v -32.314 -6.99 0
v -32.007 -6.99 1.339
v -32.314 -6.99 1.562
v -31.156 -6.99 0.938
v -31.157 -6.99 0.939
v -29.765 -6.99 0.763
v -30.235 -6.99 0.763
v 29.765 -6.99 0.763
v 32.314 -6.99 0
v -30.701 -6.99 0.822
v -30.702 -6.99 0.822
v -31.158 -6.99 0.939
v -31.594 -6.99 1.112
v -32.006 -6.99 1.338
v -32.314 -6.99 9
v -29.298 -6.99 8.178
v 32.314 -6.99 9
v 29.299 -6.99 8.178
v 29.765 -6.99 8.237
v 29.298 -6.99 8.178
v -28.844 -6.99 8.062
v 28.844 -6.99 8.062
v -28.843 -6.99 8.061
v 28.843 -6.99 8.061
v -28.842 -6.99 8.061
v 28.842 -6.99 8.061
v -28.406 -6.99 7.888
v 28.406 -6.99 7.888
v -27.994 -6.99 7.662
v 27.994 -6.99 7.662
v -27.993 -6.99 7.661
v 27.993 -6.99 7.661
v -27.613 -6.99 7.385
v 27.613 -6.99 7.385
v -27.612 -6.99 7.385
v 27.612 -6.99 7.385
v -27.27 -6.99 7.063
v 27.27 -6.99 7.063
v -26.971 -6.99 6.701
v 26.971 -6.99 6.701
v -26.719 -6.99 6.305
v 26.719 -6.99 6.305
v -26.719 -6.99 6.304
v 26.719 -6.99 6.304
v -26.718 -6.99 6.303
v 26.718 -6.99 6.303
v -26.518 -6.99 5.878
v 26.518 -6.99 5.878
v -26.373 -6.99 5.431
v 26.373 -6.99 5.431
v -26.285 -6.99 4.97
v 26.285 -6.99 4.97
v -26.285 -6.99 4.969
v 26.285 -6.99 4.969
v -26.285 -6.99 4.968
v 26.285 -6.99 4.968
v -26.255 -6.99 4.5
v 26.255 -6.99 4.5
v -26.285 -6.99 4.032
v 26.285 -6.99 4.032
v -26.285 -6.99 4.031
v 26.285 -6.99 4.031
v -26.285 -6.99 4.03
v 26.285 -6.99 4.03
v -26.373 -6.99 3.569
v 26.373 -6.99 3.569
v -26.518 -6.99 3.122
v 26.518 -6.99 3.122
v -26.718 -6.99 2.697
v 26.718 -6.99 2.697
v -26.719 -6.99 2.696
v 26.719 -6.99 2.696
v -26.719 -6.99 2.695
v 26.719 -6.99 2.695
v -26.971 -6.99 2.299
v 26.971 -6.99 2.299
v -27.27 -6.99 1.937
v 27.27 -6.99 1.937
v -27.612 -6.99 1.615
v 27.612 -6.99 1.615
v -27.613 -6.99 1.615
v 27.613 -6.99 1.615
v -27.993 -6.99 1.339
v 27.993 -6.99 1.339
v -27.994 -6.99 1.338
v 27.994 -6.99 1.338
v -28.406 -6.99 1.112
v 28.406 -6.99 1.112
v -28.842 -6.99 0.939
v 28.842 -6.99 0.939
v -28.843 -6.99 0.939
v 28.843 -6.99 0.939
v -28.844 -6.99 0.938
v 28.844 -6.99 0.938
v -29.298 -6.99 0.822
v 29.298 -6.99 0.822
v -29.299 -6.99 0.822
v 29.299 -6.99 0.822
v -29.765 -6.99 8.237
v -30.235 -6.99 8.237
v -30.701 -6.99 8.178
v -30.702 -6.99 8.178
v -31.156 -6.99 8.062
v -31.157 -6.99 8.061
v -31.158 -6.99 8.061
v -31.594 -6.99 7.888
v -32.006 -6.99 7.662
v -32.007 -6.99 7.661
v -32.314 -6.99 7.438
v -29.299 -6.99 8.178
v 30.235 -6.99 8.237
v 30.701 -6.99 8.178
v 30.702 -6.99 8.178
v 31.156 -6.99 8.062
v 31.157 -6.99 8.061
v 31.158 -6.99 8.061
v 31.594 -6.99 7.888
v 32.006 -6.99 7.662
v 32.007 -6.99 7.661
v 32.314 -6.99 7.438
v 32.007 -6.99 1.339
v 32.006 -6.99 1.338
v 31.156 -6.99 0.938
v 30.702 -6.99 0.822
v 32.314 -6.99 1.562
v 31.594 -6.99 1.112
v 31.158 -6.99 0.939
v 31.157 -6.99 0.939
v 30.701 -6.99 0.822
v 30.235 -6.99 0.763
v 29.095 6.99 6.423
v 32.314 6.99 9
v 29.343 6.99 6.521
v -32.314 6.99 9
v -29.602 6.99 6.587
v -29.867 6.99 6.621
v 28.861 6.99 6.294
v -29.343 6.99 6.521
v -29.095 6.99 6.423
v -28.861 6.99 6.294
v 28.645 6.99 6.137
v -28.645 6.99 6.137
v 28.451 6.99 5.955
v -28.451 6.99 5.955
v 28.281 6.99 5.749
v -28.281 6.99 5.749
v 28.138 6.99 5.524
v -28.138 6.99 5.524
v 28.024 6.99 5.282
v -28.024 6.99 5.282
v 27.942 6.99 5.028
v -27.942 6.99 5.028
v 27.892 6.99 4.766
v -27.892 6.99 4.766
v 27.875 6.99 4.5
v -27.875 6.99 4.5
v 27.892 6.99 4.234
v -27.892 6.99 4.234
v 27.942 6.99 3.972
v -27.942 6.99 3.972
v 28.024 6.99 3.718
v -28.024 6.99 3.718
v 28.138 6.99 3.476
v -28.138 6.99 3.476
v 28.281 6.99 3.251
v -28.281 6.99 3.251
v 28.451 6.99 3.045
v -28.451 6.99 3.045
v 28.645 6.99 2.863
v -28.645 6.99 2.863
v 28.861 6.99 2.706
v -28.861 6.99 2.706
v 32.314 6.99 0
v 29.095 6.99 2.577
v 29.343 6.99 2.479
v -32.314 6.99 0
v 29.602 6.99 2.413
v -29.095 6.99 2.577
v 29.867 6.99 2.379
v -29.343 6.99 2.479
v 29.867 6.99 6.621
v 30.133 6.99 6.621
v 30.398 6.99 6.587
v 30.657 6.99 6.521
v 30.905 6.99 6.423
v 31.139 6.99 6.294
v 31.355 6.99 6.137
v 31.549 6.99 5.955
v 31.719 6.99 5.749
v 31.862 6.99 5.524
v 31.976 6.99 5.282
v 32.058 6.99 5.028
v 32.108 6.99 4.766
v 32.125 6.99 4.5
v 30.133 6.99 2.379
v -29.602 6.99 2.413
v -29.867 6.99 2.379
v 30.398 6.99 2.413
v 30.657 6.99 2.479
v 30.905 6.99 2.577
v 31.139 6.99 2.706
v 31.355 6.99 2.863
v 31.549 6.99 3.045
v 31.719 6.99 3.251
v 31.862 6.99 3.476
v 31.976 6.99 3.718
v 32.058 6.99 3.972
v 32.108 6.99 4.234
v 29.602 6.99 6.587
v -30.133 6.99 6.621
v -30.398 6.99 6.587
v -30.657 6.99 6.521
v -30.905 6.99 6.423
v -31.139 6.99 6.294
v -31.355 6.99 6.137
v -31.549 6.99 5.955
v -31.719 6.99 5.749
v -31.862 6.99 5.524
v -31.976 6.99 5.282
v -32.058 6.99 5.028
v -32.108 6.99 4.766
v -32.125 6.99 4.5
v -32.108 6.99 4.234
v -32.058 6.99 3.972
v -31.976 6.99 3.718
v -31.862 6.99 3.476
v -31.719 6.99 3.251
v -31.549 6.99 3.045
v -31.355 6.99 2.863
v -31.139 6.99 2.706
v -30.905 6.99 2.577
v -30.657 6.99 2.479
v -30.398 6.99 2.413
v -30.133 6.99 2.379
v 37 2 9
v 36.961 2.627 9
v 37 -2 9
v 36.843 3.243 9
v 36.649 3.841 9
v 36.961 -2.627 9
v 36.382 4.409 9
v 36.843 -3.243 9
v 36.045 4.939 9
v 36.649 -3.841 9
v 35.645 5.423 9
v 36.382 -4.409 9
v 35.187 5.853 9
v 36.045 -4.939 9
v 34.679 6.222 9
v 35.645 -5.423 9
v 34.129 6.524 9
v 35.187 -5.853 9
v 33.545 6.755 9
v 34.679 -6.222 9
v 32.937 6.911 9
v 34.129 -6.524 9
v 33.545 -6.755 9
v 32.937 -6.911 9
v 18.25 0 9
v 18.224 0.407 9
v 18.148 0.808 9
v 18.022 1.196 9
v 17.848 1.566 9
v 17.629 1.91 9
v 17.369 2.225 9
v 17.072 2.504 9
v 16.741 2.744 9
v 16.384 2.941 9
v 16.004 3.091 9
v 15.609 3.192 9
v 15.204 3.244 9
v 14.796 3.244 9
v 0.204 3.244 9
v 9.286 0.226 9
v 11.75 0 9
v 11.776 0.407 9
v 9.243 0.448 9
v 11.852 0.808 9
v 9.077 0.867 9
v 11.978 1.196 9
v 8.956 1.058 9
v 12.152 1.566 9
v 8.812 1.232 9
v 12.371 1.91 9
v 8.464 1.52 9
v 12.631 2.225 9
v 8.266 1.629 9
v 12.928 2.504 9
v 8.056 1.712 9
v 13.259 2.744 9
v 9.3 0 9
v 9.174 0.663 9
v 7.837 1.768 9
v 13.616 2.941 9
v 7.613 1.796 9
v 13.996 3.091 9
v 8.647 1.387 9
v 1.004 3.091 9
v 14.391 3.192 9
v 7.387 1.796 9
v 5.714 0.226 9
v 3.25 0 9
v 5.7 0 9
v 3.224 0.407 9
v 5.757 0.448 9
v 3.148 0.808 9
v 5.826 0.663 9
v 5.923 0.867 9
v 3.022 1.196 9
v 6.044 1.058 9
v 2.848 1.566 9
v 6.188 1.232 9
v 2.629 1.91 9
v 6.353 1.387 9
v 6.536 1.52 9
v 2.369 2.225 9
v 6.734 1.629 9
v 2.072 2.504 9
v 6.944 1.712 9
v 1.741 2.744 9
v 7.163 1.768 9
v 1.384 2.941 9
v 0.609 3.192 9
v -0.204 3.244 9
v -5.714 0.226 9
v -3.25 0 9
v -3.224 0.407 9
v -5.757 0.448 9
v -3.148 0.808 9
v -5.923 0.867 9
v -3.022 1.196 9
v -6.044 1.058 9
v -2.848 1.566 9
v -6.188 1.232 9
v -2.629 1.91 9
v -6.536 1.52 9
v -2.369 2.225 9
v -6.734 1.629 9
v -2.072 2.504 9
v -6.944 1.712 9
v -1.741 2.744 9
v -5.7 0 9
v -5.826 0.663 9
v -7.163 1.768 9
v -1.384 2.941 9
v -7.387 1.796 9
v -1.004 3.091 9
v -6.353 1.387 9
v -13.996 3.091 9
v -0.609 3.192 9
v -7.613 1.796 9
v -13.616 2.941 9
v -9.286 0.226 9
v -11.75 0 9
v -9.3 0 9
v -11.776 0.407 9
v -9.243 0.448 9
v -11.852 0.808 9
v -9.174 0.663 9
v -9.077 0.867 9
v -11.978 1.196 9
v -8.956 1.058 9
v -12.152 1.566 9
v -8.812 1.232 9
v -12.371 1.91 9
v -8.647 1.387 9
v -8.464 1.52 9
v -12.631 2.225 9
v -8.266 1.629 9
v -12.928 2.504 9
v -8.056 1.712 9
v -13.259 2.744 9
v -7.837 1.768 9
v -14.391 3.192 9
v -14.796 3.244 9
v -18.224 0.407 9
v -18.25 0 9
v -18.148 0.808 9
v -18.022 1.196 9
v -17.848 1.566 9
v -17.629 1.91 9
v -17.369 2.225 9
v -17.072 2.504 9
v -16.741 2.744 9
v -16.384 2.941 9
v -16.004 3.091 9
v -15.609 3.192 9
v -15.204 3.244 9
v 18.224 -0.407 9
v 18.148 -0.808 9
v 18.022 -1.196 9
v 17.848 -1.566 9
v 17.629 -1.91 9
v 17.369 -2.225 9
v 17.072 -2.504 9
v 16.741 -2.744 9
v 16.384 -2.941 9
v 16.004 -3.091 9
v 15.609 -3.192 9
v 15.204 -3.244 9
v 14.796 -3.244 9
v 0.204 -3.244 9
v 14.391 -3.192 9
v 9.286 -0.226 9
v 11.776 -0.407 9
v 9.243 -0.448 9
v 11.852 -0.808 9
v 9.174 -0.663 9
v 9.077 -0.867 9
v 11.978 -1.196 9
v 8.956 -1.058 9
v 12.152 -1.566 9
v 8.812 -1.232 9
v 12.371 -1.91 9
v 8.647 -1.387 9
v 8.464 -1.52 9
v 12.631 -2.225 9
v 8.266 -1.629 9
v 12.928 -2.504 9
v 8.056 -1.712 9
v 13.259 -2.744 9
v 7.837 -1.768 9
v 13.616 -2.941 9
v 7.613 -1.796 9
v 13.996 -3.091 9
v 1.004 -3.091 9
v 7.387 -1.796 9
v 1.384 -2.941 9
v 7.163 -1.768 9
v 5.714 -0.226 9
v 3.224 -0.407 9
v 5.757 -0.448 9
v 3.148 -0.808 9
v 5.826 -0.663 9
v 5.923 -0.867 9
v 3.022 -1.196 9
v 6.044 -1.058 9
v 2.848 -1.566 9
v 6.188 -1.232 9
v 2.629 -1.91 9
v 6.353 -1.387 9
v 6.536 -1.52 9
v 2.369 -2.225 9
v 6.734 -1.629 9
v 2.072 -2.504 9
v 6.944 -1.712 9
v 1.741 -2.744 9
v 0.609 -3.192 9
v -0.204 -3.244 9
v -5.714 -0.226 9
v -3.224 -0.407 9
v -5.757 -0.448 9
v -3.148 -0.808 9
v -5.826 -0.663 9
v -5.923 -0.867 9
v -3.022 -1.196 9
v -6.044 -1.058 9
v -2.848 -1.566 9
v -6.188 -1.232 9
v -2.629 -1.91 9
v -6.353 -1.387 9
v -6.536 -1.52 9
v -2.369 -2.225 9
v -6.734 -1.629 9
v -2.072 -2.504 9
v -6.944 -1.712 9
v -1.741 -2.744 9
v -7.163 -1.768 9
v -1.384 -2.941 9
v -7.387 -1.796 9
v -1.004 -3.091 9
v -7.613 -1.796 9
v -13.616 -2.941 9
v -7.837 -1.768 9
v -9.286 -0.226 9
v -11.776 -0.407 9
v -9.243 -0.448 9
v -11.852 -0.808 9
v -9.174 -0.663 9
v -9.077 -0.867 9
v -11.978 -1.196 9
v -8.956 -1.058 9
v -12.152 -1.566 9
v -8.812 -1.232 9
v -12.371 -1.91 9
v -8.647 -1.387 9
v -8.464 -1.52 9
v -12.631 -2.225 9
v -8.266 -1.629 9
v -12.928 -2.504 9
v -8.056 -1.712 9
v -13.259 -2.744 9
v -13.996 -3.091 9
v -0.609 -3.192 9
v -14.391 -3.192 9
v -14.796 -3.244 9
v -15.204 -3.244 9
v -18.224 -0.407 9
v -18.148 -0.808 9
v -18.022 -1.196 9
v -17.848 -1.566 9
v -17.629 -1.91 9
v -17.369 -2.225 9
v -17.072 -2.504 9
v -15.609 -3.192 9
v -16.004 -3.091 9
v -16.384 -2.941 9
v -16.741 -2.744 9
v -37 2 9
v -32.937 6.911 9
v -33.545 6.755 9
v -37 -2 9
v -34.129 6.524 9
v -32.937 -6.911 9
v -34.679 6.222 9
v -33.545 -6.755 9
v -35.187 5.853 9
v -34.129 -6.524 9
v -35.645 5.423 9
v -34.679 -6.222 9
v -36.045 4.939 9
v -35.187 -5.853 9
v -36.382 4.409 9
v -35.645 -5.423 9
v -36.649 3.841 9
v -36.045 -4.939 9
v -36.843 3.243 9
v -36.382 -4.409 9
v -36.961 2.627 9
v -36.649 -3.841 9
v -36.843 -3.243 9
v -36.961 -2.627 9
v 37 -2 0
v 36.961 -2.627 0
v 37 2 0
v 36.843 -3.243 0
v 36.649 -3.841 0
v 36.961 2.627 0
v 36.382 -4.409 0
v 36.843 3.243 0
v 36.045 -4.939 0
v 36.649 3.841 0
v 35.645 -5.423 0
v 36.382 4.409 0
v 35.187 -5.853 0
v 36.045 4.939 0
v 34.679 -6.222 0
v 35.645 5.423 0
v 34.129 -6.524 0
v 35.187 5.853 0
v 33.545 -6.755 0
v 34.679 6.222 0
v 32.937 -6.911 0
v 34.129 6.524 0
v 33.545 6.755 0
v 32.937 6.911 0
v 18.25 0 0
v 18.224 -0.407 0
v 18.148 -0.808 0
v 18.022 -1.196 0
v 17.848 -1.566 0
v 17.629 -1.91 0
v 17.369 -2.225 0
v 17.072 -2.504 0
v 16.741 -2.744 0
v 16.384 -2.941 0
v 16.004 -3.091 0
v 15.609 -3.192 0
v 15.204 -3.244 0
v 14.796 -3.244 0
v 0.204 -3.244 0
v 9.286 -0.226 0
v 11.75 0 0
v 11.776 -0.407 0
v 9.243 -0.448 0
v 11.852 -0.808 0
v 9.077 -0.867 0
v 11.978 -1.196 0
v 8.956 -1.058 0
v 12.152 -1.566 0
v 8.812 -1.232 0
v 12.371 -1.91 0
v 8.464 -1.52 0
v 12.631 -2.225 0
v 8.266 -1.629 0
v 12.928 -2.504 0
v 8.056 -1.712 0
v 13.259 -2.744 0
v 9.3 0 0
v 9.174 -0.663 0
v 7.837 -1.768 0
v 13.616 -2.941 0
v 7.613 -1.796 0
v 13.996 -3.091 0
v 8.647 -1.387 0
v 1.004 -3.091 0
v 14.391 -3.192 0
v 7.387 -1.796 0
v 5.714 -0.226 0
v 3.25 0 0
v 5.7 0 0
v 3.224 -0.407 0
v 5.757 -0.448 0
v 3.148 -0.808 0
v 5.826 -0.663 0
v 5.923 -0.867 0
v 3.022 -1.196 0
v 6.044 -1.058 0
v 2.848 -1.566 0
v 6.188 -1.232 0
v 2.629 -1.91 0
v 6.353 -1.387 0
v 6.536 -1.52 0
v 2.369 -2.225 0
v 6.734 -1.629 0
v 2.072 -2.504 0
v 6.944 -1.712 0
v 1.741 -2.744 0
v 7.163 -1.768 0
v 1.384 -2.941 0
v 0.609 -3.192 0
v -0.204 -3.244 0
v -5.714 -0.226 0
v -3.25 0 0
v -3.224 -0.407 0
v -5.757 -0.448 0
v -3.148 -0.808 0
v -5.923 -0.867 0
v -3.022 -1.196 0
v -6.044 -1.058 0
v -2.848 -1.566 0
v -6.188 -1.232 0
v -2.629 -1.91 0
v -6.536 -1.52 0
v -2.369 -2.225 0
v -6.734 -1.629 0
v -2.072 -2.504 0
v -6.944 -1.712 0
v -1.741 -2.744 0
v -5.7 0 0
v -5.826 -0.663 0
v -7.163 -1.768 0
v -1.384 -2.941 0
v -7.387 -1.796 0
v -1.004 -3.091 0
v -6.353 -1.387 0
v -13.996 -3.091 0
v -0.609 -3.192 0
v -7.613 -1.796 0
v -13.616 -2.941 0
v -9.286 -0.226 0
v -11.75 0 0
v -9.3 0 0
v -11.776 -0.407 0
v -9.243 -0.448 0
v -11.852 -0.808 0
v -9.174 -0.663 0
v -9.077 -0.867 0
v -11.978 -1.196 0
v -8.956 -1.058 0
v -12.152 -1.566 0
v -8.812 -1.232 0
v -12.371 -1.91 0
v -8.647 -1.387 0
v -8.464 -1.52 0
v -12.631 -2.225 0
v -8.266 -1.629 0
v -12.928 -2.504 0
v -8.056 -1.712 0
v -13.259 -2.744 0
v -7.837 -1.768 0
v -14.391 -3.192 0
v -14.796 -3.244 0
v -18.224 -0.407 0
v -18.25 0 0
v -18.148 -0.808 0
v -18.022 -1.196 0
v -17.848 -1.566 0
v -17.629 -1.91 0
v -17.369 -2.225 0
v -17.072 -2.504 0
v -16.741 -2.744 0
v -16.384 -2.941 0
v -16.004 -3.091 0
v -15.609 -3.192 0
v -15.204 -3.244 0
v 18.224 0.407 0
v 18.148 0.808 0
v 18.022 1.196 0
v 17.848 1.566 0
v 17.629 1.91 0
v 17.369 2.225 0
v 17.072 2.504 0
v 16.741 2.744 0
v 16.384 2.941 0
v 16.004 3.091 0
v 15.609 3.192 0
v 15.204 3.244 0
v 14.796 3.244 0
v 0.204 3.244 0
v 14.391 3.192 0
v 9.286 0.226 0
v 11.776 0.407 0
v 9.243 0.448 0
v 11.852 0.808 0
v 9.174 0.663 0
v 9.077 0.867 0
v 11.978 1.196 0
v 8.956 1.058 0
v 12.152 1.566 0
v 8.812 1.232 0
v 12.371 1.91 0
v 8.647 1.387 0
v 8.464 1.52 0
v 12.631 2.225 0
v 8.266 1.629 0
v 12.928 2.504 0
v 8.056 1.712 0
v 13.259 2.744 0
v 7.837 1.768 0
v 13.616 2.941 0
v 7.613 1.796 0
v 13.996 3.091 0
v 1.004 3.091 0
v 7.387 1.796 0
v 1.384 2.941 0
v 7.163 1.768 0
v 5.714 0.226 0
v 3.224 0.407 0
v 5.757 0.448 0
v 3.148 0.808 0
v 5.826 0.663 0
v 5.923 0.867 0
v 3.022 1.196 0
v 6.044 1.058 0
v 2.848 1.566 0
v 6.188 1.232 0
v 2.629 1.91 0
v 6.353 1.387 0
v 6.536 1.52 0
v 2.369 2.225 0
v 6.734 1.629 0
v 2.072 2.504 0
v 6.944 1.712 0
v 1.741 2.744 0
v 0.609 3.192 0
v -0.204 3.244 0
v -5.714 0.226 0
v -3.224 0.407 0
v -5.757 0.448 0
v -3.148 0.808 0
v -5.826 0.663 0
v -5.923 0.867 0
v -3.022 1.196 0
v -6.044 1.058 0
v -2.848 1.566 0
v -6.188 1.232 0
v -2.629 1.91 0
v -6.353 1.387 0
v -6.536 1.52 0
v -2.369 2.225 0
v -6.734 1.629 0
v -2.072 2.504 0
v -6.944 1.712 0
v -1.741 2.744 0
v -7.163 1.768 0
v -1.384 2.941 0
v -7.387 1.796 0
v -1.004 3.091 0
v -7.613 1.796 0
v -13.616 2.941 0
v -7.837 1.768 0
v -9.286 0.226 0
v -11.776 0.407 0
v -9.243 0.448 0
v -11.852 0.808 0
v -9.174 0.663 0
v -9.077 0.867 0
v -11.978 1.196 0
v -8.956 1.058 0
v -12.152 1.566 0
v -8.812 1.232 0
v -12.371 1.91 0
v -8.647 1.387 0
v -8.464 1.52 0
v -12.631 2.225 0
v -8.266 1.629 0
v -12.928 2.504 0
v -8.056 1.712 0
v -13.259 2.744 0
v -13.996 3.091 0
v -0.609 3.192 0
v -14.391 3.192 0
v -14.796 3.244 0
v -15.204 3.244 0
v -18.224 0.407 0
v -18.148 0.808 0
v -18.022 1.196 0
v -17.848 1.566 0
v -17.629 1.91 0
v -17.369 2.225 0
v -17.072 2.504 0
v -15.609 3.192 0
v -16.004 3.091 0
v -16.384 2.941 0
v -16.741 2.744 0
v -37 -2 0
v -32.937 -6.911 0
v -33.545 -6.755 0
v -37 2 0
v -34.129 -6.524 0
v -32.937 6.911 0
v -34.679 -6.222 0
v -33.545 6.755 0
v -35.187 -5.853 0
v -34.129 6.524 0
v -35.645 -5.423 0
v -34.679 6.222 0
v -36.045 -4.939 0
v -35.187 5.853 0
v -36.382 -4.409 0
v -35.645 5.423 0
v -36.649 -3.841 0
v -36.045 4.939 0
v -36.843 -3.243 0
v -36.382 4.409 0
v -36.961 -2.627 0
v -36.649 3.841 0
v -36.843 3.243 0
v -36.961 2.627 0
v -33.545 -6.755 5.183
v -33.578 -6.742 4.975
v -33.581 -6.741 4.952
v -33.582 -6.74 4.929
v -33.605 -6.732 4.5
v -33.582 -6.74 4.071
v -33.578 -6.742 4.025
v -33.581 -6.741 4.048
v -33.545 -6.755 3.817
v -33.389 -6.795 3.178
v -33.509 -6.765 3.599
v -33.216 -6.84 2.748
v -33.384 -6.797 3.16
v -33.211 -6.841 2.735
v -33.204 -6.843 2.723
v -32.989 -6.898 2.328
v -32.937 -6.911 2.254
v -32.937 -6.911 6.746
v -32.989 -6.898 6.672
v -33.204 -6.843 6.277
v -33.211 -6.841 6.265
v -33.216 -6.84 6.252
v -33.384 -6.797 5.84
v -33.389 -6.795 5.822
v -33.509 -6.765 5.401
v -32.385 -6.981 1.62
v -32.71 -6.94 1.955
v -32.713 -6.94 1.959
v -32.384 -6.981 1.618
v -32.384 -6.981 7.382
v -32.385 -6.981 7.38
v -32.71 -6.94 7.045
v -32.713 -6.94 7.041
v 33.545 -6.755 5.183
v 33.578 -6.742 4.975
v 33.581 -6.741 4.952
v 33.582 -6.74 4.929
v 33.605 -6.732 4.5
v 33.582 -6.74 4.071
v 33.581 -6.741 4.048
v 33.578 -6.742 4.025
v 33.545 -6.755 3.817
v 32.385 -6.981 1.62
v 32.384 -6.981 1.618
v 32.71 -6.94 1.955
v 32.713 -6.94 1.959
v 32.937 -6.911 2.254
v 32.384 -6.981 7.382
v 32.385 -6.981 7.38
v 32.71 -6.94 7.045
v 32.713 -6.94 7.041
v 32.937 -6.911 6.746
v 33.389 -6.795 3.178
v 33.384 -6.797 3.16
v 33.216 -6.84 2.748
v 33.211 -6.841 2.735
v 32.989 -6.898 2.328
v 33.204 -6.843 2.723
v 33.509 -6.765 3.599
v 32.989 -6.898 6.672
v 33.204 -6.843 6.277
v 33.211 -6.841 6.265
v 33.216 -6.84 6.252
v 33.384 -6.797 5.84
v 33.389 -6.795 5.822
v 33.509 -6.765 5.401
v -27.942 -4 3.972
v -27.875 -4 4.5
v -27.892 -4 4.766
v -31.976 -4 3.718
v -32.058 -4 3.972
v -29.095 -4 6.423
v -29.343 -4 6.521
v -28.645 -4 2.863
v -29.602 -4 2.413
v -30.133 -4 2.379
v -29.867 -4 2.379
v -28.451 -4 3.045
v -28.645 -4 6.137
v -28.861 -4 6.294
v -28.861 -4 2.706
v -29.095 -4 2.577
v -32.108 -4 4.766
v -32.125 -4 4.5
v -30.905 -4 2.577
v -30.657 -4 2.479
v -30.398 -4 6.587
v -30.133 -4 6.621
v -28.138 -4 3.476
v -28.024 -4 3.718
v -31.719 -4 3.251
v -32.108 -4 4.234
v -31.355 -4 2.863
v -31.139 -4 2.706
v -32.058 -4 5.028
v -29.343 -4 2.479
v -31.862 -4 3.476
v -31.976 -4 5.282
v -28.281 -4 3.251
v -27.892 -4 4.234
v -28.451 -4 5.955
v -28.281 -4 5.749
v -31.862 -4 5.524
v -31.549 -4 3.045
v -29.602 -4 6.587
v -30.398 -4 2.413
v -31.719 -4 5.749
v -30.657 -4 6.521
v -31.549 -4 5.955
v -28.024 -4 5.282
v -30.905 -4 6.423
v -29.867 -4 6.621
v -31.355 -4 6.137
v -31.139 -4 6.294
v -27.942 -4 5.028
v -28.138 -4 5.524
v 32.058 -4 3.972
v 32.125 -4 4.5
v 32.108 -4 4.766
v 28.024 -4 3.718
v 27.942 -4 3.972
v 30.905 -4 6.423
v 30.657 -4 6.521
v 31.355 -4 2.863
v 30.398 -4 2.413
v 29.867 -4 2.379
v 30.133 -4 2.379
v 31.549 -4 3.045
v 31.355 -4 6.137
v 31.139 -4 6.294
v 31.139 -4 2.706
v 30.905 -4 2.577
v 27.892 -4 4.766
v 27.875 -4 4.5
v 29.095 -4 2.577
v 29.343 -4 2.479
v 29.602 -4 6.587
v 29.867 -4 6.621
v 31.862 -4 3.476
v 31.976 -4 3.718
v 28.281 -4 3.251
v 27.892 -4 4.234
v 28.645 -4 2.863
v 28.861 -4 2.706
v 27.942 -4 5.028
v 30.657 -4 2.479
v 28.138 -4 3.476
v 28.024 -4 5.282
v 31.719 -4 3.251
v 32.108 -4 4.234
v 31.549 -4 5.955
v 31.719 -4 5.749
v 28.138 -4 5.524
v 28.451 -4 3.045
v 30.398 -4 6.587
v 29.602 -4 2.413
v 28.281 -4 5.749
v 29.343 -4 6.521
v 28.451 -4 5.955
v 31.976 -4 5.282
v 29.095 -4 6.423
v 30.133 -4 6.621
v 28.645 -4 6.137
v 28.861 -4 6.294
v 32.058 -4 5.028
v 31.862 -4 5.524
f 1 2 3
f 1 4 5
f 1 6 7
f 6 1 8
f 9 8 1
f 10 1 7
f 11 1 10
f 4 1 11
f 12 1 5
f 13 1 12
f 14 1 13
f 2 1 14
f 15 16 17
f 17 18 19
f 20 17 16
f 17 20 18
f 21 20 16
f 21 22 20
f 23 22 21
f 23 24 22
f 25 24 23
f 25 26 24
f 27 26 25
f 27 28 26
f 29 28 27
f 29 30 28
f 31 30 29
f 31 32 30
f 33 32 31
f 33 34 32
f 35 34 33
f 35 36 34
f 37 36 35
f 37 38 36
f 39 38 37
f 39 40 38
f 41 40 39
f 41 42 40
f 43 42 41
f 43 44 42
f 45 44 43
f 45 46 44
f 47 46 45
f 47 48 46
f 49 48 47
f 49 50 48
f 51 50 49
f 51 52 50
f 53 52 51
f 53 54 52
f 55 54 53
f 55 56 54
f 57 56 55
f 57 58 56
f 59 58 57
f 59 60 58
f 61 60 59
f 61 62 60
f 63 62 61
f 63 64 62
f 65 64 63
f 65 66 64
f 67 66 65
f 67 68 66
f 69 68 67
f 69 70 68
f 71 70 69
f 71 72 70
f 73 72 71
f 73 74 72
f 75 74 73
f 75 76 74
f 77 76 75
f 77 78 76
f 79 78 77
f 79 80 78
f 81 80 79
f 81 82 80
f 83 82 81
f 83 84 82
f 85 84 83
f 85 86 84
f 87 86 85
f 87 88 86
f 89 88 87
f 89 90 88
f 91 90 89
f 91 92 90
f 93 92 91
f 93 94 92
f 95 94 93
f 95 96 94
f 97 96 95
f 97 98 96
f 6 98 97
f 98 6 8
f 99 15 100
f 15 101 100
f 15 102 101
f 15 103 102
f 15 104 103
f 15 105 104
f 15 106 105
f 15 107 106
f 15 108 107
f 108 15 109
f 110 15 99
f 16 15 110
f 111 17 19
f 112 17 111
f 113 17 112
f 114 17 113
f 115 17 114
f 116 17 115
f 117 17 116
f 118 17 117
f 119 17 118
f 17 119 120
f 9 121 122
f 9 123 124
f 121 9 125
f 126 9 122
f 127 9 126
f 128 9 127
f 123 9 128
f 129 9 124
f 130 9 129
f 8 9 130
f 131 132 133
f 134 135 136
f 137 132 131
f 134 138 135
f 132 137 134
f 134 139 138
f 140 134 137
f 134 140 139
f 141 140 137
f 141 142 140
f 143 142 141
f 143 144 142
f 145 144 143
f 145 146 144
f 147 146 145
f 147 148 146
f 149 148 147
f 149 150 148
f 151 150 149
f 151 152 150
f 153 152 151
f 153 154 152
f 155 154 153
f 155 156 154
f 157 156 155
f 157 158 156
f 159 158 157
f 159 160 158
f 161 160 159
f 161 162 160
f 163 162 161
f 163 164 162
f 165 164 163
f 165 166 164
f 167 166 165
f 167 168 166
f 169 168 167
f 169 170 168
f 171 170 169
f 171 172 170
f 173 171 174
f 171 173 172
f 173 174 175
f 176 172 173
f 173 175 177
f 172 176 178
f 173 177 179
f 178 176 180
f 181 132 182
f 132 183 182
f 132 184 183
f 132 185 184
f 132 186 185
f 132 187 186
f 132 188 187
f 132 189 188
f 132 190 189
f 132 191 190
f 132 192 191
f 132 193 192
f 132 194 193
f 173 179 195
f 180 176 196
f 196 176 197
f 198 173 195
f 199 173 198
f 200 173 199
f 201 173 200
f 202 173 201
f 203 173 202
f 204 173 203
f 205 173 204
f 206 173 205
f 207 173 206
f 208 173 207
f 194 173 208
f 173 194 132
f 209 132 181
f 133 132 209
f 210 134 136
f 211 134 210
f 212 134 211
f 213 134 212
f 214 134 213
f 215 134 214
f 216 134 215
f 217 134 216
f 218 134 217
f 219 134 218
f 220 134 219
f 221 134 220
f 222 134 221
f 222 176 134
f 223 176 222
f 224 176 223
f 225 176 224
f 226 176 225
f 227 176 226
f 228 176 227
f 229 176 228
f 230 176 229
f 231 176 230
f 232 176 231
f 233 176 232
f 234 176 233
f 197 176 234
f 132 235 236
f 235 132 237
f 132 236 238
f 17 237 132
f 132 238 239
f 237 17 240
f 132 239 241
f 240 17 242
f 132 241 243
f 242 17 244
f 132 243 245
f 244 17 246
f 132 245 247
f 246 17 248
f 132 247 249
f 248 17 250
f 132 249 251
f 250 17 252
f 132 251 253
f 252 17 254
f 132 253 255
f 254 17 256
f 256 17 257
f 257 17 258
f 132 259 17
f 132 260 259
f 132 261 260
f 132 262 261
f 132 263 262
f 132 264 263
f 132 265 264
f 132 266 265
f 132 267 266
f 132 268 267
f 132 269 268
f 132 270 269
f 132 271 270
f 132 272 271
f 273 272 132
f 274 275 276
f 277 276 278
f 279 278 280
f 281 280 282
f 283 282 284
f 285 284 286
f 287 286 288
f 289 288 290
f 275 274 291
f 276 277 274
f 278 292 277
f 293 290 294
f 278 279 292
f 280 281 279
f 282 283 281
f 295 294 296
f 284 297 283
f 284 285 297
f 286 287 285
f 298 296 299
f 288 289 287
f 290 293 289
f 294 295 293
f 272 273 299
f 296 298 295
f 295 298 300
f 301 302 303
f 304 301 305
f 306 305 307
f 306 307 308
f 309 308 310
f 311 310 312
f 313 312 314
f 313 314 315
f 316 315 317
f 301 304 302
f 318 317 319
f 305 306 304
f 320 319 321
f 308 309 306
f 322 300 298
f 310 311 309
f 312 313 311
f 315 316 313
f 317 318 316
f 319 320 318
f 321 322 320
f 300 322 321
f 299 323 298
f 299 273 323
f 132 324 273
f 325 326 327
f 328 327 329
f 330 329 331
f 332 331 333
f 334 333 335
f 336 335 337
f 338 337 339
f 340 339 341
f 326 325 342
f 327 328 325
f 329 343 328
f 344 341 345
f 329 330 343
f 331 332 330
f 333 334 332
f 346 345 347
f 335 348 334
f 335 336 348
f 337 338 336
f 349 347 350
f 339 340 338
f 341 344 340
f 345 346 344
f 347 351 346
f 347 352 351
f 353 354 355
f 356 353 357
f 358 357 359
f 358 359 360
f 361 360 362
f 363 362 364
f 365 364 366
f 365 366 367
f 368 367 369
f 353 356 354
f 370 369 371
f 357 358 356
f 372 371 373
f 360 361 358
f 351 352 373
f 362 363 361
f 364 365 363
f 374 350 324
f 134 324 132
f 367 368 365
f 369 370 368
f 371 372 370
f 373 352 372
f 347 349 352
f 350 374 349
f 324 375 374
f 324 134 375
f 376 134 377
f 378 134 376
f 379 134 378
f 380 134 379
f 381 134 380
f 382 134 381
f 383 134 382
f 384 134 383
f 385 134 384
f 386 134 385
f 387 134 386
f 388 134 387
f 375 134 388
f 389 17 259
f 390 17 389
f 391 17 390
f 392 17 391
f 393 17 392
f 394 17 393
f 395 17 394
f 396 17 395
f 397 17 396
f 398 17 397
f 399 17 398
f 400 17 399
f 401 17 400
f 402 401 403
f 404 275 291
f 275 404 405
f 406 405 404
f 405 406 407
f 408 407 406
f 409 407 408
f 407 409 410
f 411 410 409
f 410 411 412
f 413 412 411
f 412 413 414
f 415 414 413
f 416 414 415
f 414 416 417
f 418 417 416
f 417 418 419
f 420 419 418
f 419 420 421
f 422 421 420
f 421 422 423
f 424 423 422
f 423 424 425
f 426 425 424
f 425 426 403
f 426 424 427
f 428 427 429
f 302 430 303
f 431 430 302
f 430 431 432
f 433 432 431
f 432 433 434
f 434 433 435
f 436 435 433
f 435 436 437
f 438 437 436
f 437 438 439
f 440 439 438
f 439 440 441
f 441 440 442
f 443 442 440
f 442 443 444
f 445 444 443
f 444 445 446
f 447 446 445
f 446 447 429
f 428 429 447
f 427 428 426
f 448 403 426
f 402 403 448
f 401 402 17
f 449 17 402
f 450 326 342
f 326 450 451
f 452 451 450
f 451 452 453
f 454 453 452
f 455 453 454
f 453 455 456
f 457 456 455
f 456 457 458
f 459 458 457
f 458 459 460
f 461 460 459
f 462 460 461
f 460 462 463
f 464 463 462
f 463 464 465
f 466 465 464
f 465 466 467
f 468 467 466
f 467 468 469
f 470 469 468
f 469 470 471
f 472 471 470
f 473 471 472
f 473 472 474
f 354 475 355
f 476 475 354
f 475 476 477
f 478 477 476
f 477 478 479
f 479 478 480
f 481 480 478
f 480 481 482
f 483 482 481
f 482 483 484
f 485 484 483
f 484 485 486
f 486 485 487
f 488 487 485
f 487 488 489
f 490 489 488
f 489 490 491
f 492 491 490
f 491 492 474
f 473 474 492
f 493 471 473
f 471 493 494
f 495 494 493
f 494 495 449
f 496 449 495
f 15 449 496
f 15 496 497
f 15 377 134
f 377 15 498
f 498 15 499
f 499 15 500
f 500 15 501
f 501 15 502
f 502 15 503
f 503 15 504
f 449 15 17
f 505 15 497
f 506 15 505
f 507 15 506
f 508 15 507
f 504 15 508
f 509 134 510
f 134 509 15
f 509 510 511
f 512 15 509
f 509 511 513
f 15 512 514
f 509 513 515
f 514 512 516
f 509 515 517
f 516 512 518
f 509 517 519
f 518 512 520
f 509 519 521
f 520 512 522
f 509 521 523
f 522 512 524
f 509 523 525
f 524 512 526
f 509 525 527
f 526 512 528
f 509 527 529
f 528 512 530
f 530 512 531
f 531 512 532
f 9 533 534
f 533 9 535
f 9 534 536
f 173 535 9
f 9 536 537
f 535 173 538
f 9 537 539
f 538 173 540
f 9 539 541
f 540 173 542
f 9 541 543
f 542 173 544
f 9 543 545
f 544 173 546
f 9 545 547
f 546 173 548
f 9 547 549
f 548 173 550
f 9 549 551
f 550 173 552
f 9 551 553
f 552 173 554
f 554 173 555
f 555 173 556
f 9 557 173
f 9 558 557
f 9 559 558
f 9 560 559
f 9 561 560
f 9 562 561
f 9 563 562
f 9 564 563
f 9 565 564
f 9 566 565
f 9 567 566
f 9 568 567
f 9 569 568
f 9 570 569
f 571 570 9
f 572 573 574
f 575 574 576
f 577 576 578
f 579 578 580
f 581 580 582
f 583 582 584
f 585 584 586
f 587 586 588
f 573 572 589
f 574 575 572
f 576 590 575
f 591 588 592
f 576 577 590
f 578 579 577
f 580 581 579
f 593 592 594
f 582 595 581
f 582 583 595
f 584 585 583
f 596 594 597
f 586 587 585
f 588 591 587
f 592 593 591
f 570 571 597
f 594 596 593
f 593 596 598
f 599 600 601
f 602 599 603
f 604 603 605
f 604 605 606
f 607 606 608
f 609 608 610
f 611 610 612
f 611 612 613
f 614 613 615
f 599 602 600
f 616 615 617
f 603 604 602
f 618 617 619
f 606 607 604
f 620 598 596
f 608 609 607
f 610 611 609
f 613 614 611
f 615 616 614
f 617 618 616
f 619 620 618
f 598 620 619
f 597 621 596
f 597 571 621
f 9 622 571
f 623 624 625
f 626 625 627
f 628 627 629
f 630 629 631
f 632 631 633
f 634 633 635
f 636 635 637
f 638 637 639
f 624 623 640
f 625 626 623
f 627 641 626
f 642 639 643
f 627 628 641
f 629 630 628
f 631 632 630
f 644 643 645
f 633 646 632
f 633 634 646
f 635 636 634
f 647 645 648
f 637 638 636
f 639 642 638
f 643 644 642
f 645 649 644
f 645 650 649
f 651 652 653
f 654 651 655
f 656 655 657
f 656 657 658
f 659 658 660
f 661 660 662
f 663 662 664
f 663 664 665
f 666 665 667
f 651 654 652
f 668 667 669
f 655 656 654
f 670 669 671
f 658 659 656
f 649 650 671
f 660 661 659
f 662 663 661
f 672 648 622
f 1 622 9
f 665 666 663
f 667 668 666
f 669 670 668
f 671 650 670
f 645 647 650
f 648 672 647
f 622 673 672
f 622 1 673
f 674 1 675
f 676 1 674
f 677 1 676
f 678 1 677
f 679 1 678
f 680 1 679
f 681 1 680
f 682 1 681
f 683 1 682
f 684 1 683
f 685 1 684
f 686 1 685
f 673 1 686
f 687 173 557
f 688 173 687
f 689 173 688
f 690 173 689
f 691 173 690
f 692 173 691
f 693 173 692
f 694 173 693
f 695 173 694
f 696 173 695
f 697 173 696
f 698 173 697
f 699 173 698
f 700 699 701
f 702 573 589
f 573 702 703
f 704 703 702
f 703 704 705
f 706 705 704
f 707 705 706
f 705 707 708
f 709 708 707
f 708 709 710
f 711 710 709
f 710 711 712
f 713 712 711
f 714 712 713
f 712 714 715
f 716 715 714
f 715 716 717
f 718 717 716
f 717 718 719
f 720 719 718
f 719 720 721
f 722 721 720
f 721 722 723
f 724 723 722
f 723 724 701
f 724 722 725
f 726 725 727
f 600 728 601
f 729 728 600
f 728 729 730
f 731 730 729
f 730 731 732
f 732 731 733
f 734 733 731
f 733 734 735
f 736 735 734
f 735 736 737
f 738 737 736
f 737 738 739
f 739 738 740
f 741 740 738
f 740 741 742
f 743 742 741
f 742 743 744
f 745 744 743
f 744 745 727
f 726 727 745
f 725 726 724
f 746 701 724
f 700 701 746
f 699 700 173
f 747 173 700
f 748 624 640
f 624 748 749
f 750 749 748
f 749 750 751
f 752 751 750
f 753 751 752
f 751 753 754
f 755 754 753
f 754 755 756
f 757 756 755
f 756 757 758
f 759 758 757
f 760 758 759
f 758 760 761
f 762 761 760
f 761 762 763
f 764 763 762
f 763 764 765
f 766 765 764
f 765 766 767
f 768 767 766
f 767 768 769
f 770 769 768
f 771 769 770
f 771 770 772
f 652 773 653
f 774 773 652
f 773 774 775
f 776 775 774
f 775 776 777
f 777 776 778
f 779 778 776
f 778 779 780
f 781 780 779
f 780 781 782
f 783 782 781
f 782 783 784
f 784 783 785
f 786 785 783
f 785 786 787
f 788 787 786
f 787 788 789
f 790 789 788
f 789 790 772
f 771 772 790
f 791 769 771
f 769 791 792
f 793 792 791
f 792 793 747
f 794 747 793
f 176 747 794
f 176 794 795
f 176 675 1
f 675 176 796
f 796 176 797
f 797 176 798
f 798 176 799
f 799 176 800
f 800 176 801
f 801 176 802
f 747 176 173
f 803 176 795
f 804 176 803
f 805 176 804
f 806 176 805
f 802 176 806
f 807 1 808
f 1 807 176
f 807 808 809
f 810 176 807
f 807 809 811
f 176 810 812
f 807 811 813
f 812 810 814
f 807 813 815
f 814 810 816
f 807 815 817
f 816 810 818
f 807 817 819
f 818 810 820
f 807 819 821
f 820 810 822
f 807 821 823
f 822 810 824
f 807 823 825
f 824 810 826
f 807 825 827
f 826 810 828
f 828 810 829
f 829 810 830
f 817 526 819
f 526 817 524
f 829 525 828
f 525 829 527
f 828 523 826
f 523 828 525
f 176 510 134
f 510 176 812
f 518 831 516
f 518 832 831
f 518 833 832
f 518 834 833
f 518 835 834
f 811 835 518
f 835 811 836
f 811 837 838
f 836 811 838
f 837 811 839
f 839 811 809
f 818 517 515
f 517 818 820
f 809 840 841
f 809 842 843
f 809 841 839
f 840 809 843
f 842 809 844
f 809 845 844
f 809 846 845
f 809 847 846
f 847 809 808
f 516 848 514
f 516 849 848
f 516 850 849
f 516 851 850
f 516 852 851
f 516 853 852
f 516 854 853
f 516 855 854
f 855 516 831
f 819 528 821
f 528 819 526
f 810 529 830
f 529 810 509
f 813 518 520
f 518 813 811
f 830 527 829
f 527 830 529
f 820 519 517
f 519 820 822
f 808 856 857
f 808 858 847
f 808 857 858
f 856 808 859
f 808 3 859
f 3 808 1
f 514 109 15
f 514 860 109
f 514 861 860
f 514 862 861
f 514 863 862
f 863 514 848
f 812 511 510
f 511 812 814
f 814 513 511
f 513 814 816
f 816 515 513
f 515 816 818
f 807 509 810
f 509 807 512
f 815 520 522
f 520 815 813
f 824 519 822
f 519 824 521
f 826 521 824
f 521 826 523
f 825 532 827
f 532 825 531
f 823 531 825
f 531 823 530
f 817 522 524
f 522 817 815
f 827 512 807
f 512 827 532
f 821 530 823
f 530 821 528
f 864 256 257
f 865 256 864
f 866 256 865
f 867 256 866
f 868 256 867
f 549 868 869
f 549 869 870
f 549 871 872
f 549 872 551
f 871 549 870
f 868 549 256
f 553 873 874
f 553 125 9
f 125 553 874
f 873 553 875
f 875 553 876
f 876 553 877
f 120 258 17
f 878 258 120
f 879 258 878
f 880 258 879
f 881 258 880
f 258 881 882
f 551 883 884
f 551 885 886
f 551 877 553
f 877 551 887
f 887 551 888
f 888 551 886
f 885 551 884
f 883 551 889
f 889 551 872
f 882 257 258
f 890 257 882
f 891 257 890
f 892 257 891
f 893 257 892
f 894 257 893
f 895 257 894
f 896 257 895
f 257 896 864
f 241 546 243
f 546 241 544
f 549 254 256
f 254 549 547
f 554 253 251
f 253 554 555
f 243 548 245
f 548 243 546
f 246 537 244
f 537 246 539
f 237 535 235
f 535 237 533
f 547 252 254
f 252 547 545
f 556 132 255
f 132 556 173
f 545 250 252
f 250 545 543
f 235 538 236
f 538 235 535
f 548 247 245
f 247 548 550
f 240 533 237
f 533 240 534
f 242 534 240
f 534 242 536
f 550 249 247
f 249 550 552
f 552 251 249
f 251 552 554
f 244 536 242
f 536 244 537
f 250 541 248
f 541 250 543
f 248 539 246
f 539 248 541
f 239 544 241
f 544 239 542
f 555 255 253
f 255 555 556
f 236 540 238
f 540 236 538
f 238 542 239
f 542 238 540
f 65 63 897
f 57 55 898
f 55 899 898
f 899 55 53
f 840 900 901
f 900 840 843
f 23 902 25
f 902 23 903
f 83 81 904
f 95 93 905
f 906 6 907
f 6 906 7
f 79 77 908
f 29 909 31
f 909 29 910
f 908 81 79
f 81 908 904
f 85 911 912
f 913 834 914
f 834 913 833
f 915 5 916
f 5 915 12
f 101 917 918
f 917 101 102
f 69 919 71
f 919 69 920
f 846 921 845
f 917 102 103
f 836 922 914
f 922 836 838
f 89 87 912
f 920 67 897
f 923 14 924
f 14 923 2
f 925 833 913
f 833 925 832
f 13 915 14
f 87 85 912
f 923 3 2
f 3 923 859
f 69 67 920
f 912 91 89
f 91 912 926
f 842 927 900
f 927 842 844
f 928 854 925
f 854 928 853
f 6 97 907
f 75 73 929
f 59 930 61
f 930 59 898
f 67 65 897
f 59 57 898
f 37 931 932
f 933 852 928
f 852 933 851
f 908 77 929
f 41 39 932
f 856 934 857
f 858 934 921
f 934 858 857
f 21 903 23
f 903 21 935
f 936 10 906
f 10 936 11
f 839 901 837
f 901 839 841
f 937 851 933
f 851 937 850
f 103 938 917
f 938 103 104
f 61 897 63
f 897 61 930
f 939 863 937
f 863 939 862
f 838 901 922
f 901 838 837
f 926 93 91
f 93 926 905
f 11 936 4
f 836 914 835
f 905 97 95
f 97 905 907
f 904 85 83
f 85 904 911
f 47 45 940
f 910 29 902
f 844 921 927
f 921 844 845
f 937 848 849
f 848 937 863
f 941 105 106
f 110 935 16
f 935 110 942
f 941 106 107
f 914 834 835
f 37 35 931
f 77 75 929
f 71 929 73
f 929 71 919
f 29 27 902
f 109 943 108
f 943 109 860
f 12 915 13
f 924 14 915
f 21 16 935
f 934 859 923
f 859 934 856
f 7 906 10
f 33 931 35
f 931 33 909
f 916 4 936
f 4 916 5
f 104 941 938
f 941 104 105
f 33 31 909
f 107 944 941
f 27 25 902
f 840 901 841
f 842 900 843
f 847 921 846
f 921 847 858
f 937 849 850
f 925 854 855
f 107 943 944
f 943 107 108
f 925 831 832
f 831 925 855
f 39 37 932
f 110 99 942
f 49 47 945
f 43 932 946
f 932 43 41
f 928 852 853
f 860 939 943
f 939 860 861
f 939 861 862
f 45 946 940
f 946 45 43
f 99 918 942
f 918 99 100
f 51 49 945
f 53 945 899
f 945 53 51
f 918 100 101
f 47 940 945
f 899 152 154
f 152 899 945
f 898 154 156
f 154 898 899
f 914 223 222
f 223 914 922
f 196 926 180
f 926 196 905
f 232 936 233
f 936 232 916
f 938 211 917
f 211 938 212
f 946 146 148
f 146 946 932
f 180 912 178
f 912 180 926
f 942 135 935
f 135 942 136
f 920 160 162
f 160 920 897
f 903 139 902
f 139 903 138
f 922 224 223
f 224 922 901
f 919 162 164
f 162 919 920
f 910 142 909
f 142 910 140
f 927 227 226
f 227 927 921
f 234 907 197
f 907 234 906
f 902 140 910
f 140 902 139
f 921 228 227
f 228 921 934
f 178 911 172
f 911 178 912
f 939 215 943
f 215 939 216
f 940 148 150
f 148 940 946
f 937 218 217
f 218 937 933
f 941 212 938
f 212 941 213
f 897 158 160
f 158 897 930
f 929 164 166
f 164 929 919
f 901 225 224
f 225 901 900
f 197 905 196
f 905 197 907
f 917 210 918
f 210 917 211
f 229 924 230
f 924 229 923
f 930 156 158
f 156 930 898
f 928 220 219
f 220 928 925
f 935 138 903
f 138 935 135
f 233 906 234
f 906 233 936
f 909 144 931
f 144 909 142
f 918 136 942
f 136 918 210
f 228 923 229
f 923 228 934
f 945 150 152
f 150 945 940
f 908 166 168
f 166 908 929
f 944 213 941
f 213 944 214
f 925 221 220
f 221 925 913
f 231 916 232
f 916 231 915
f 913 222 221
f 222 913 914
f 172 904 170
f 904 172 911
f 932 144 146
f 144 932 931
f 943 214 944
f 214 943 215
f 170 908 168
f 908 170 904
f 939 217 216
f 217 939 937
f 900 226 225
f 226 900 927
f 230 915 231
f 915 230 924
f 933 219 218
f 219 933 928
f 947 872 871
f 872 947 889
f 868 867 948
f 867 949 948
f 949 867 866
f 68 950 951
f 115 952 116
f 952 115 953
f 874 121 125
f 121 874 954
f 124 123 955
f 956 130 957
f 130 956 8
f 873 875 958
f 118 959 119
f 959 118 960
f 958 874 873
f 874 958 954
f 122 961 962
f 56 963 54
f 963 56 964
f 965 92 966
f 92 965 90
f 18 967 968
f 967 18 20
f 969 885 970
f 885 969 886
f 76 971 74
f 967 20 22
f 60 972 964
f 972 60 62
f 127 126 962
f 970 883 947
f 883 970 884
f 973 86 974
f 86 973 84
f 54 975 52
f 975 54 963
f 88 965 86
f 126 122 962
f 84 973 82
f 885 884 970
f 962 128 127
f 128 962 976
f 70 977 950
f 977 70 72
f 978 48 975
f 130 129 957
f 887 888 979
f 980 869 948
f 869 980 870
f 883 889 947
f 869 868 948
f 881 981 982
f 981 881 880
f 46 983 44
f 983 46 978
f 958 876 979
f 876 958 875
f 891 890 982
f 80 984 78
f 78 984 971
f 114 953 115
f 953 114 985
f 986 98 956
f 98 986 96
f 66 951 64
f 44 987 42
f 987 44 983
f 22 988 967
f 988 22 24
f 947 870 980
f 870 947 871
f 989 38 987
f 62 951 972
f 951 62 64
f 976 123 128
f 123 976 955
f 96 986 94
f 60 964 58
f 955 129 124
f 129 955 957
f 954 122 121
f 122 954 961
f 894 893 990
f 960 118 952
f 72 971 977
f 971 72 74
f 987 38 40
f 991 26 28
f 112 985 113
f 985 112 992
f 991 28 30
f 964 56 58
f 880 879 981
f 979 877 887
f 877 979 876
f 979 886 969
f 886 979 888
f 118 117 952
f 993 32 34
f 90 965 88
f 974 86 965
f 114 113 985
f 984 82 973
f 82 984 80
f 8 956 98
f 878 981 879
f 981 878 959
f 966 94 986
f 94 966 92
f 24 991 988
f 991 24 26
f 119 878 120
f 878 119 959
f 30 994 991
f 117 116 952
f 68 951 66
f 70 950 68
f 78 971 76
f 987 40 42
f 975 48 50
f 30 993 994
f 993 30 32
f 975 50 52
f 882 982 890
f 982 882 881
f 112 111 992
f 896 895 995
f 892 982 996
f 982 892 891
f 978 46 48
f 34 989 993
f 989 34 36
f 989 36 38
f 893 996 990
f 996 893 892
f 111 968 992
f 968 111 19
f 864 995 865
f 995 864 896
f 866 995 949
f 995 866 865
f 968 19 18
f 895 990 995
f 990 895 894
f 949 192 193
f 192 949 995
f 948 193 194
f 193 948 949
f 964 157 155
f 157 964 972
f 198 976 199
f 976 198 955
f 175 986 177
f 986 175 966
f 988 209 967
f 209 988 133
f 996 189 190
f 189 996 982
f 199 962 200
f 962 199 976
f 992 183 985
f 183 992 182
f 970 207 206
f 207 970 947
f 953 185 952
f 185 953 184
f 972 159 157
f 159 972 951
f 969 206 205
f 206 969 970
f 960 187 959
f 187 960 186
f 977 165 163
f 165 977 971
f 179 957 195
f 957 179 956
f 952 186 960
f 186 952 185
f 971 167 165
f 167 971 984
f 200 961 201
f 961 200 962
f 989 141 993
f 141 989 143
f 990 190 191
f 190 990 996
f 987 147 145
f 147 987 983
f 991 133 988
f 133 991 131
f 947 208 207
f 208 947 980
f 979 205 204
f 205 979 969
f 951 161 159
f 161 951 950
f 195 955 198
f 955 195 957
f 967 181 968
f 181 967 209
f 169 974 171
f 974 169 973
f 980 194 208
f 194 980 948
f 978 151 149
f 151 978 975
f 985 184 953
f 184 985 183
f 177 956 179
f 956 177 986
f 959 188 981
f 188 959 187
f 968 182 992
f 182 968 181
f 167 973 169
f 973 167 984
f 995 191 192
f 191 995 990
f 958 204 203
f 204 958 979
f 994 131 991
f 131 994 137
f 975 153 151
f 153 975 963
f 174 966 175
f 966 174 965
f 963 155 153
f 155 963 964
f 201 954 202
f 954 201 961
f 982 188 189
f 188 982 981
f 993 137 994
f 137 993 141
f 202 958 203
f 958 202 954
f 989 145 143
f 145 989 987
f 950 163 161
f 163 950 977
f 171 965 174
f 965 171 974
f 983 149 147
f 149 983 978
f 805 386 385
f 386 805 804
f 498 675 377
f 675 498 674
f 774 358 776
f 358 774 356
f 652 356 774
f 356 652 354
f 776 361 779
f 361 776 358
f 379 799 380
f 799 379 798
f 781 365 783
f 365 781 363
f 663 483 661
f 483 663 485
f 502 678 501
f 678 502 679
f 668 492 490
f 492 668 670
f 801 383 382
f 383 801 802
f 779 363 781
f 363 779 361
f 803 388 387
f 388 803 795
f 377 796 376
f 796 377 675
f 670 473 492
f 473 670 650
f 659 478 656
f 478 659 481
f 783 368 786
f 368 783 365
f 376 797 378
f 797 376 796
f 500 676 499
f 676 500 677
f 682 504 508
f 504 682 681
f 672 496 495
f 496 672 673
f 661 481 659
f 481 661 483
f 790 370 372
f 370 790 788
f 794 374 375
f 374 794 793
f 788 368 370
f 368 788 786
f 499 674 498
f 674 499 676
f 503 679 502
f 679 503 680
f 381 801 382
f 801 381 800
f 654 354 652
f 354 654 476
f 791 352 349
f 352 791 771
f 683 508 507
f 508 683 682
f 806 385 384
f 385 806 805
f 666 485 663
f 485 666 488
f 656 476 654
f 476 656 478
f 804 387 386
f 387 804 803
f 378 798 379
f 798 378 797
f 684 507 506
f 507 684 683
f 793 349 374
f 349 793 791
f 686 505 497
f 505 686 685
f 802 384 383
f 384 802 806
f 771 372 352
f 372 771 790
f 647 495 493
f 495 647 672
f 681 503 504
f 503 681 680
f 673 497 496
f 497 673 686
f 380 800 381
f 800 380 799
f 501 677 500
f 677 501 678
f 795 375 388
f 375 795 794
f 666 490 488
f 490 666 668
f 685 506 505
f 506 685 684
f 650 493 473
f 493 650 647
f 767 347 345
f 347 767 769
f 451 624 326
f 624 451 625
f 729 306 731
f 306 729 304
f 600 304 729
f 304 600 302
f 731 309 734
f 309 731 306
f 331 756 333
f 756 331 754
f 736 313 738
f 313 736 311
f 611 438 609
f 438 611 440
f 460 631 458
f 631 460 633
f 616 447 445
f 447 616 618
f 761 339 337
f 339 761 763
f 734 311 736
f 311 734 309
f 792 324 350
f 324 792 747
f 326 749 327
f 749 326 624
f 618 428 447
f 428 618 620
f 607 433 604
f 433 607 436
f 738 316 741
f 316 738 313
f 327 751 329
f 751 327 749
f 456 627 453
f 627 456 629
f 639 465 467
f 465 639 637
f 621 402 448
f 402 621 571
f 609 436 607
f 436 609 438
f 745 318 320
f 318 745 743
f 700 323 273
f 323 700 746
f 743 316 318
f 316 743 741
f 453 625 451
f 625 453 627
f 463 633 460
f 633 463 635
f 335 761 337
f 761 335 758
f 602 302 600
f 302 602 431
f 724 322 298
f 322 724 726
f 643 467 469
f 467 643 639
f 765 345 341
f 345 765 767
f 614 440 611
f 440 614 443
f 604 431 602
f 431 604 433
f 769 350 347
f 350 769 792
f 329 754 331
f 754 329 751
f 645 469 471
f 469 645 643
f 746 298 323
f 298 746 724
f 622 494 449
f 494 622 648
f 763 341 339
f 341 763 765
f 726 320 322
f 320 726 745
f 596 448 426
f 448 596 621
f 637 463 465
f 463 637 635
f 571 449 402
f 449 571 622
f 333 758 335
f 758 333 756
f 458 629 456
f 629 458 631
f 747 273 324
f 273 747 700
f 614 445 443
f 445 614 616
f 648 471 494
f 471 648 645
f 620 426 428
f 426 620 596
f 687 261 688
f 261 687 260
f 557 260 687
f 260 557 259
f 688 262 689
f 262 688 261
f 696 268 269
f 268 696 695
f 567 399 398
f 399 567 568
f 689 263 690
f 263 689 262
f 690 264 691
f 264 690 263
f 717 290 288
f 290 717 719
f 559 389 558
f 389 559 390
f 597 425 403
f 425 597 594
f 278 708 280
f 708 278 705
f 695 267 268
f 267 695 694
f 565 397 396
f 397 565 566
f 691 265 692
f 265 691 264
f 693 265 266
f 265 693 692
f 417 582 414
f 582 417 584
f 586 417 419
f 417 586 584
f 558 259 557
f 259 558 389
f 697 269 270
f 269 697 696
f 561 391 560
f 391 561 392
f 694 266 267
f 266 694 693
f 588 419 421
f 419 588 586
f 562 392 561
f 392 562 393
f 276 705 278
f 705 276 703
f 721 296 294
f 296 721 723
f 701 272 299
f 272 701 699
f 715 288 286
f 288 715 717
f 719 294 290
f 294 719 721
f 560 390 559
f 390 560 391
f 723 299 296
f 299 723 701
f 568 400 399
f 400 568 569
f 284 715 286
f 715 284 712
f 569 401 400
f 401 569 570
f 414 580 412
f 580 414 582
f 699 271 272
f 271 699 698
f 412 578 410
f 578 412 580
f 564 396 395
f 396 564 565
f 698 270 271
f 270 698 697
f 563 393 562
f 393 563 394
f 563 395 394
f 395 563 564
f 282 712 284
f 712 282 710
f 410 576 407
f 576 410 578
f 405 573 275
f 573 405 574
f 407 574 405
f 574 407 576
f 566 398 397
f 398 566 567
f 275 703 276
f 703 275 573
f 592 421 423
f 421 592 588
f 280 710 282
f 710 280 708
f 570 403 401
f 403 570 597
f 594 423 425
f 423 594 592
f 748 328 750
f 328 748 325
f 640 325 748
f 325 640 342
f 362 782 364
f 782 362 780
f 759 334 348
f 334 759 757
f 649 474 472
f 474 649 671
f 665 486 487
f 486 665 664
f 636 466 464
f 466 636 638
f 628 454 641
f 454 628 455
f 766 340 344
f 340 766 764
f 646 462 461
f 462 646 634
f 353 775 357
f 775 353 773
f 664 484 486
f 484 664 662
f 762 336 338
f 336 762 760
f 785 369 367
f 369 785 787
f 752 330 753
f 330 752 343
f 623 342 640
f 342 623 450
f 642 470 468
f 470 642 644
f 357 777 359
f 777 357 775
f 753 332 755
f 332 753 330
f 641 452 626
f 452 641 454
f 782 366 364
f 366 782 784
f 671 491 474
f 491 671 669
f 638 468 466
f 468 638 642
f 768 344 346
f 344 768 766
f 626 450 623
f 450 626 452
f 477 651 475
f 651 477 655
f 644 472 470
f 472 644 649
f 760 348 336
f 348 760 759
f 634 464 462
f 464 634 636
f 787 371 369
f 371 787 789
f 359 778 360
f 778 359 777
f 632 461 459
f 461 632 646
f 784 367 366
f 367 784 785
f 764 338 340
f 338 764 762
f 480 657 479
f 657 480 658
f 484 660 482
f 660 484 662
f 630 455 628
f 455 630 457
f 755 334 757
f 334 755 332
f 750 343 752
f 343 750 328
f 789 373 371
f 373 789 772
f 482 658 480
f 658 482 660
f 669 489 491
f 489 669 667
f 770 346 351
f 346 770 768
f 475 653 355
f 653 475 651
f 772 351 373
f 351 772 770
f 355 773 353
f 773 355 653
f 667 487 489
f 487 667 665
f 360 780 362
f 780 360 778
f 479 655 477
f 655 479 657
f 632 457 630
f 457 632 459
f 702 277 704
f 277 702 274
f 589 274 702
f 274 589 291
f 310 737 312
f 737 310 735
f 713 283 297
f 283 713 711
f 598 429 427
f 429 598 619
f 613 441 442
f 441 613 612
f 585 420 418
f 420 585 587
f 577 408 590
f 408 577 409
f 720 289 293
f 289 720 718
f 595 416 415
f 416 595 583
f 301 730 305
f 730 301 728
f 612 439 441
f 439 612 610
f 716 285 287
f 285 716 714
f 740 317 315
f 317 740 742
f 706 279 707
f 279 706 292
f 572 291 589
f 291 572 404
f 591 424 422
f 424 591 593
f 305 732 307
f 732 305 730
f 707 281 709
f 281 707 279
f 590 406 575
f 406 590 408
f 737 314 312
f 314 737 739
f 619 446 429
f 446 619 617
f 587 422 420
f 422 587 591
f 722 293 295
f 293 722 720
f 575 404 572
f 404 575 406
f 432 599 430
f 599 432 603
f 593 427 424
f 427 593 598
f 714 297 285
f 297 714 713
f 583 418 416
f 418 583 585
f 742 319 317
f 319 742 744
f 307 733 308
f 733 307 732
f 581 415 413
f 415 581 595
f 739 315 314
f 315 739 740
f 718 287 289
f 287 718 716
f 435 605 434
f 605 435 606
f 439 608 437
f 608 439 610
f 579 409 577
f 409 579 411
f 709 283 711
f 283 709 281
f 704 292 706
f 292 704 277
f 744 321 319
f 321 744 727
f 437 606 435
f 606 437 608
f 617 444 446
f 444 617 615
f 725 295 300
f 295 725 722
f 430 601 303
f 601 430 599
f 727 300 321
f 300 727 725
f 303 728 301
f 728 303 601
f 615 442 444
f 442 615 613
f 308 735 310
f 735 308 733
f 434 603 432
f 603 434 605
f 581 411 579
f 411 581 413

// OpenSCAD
$fn = 50;


difference() {
	union() {
		hull() {
			translate(v = [-17.0000000000, 2.0000000000, 0]) {
				cylinder(h = 9, r = 5);
			}
			translate(v = [17.0000000000, 2.0000000000, 0]) {
				cylinder(h = 9, r = 5);
			}
			translate(v = [-17.0000000000, -2.0000000000, 0]) {
				cylinder(h = 9, r = 5);
			}
			translate(v = [17.0000000000, -2.0000000000, 0]) {
				cylinder(h = 9, r = 5);
			}
		}
		translate(v = [-22.5000000000, 0.0000000000, 0]) {
			hull() {
				translate(v = [-9.5000000000, 2.0000000000, 0]) {
					cylinder(h = 9, r = 5);
				}
				translate(v = [9.5000000000, 2.0000000000, 0]) {
					cylinder(h = 9, r = 5);
				}
				translate(v = [-9.5000000000, -2.0000000000, 0]) {
					cylinder(h = 9, r = 5);
				}
				translate(v = [9.5000000000, -2.0000000000, 0]) {
					cylinder(h = 9, r = 5);
				}
			}
		}
		translate(v = [22.5000000000, 0.0000000000, 0]) {
			hull() {
				translate(v = [-9.5000000000, 2.0000000000, 0]) {
					cylinder(h = 9, r = 5);
				}
				translate(v = [9.5000000000, 2.0000000000, 0]) {
					cylinder(h = 9, r = 5);
				}
				translate(v = [-9.5000000000, -2.0000000000, 0]) {
					cylinder(h = 9, r = 5);
				}
				translate(v = [9.5000000000, -2.0000000000, 0]) {
					cylinder(h = 9, r = 5);
				}
			}
		}
	}
	union() {
		translate(v = [-30.0000000000, -7.0000000000, 4.5000000000]) {
			rotate(a = [90, 0, 0]) {
				difference() {
					union() {
						#translate(v = [0, 0, -14.0000000000]) {
							cylinder(h = 14, r = 2.0000000000);
						}
						#translate(v = [0, 0, -3]) {
							cylinder(h = 3, r1 = 2.1250000000, r2 = 3.7500000000);
						}
						#translate(v = [0, 0, -14.0000000000]) {
							cylinder(h = 14, r = 2.1250000000);
						}
						#translate(v = [0, 0, -14.0000000000]) {
							cylinder(h = 14, r = 2.0000000000);
						}
					}
					union();
				}
			}
		}
		translate(v = [30.0000000000, -7.0000000000, 4.5000000000]) {
			rotate(a = [90, 0, 0]) {
				difference() {
					union() {
						#translate(v = [0, 0, -14.0000000000]) {
							cylinder(h = 14, r = 2.0000000000);
						}
						#translate(v = [0, 0, -3]) {
							cylinder(h = 3, r1 = 2.1250000000, r2 = 3.7500000000);
						}
						#translate(v = [0, 0, -14.0000000000]) {
							cylinder(h = 14, r = 2.1250000000);
						}
						#translate(v = [0, 0, -14.0000000000]) {
							cylinder(h = 14, r = 2.0000000000);
						}
					}
					union();
				}
			}
		}
		translate(v = [-15.0000000000, 0.0000000000, 0]) {
			translate(v = [0, 0, -100]) {
				cylinder(h = 200, r = 3.2500000000);
			}
		}
		translate(v = [0, 0, -100]) {
			cylinder(h = 200, r = 3.2500000000);
		}
		translate(v = [15.0000000000, 0.0000000000, 0]) {
			translate(v = [0, 0, -100]) {
				cylinder(h = 200, r = 3.2500000000);
			}
		}
		translate(v = [-15.0000000000, 0.0000000000, 0]) {
			translate(v = [0, 0, -100]) {
				cylinder(h = 200, r = 1.8000000000);
			}
		}
		translate(v = [-7.5000000000, 0.0000000000, 0]) {
			translate(v = [0, 0, -100]) {
				cylinder(h = 200, r = 1.8000000000);
			}
		}
		translate(v = [0, 0, -100]) {
			cylinder(h = 200, r = 1.8000000000);
		}
		translate(v = [7.5000000000, 0.0000000000, 0]) {
			translate(v = [0, 0, -100]) {
				cylinder(h = 200, r = 1.8000000000);
			}
		}
		translate(v = [15.0000000000, 0.0000000000, 0]) {
			translate(v = [0, 0, -100]) {
				cylinder(h = 200, r = 1.8000000000);
			}
		}
	}
}
